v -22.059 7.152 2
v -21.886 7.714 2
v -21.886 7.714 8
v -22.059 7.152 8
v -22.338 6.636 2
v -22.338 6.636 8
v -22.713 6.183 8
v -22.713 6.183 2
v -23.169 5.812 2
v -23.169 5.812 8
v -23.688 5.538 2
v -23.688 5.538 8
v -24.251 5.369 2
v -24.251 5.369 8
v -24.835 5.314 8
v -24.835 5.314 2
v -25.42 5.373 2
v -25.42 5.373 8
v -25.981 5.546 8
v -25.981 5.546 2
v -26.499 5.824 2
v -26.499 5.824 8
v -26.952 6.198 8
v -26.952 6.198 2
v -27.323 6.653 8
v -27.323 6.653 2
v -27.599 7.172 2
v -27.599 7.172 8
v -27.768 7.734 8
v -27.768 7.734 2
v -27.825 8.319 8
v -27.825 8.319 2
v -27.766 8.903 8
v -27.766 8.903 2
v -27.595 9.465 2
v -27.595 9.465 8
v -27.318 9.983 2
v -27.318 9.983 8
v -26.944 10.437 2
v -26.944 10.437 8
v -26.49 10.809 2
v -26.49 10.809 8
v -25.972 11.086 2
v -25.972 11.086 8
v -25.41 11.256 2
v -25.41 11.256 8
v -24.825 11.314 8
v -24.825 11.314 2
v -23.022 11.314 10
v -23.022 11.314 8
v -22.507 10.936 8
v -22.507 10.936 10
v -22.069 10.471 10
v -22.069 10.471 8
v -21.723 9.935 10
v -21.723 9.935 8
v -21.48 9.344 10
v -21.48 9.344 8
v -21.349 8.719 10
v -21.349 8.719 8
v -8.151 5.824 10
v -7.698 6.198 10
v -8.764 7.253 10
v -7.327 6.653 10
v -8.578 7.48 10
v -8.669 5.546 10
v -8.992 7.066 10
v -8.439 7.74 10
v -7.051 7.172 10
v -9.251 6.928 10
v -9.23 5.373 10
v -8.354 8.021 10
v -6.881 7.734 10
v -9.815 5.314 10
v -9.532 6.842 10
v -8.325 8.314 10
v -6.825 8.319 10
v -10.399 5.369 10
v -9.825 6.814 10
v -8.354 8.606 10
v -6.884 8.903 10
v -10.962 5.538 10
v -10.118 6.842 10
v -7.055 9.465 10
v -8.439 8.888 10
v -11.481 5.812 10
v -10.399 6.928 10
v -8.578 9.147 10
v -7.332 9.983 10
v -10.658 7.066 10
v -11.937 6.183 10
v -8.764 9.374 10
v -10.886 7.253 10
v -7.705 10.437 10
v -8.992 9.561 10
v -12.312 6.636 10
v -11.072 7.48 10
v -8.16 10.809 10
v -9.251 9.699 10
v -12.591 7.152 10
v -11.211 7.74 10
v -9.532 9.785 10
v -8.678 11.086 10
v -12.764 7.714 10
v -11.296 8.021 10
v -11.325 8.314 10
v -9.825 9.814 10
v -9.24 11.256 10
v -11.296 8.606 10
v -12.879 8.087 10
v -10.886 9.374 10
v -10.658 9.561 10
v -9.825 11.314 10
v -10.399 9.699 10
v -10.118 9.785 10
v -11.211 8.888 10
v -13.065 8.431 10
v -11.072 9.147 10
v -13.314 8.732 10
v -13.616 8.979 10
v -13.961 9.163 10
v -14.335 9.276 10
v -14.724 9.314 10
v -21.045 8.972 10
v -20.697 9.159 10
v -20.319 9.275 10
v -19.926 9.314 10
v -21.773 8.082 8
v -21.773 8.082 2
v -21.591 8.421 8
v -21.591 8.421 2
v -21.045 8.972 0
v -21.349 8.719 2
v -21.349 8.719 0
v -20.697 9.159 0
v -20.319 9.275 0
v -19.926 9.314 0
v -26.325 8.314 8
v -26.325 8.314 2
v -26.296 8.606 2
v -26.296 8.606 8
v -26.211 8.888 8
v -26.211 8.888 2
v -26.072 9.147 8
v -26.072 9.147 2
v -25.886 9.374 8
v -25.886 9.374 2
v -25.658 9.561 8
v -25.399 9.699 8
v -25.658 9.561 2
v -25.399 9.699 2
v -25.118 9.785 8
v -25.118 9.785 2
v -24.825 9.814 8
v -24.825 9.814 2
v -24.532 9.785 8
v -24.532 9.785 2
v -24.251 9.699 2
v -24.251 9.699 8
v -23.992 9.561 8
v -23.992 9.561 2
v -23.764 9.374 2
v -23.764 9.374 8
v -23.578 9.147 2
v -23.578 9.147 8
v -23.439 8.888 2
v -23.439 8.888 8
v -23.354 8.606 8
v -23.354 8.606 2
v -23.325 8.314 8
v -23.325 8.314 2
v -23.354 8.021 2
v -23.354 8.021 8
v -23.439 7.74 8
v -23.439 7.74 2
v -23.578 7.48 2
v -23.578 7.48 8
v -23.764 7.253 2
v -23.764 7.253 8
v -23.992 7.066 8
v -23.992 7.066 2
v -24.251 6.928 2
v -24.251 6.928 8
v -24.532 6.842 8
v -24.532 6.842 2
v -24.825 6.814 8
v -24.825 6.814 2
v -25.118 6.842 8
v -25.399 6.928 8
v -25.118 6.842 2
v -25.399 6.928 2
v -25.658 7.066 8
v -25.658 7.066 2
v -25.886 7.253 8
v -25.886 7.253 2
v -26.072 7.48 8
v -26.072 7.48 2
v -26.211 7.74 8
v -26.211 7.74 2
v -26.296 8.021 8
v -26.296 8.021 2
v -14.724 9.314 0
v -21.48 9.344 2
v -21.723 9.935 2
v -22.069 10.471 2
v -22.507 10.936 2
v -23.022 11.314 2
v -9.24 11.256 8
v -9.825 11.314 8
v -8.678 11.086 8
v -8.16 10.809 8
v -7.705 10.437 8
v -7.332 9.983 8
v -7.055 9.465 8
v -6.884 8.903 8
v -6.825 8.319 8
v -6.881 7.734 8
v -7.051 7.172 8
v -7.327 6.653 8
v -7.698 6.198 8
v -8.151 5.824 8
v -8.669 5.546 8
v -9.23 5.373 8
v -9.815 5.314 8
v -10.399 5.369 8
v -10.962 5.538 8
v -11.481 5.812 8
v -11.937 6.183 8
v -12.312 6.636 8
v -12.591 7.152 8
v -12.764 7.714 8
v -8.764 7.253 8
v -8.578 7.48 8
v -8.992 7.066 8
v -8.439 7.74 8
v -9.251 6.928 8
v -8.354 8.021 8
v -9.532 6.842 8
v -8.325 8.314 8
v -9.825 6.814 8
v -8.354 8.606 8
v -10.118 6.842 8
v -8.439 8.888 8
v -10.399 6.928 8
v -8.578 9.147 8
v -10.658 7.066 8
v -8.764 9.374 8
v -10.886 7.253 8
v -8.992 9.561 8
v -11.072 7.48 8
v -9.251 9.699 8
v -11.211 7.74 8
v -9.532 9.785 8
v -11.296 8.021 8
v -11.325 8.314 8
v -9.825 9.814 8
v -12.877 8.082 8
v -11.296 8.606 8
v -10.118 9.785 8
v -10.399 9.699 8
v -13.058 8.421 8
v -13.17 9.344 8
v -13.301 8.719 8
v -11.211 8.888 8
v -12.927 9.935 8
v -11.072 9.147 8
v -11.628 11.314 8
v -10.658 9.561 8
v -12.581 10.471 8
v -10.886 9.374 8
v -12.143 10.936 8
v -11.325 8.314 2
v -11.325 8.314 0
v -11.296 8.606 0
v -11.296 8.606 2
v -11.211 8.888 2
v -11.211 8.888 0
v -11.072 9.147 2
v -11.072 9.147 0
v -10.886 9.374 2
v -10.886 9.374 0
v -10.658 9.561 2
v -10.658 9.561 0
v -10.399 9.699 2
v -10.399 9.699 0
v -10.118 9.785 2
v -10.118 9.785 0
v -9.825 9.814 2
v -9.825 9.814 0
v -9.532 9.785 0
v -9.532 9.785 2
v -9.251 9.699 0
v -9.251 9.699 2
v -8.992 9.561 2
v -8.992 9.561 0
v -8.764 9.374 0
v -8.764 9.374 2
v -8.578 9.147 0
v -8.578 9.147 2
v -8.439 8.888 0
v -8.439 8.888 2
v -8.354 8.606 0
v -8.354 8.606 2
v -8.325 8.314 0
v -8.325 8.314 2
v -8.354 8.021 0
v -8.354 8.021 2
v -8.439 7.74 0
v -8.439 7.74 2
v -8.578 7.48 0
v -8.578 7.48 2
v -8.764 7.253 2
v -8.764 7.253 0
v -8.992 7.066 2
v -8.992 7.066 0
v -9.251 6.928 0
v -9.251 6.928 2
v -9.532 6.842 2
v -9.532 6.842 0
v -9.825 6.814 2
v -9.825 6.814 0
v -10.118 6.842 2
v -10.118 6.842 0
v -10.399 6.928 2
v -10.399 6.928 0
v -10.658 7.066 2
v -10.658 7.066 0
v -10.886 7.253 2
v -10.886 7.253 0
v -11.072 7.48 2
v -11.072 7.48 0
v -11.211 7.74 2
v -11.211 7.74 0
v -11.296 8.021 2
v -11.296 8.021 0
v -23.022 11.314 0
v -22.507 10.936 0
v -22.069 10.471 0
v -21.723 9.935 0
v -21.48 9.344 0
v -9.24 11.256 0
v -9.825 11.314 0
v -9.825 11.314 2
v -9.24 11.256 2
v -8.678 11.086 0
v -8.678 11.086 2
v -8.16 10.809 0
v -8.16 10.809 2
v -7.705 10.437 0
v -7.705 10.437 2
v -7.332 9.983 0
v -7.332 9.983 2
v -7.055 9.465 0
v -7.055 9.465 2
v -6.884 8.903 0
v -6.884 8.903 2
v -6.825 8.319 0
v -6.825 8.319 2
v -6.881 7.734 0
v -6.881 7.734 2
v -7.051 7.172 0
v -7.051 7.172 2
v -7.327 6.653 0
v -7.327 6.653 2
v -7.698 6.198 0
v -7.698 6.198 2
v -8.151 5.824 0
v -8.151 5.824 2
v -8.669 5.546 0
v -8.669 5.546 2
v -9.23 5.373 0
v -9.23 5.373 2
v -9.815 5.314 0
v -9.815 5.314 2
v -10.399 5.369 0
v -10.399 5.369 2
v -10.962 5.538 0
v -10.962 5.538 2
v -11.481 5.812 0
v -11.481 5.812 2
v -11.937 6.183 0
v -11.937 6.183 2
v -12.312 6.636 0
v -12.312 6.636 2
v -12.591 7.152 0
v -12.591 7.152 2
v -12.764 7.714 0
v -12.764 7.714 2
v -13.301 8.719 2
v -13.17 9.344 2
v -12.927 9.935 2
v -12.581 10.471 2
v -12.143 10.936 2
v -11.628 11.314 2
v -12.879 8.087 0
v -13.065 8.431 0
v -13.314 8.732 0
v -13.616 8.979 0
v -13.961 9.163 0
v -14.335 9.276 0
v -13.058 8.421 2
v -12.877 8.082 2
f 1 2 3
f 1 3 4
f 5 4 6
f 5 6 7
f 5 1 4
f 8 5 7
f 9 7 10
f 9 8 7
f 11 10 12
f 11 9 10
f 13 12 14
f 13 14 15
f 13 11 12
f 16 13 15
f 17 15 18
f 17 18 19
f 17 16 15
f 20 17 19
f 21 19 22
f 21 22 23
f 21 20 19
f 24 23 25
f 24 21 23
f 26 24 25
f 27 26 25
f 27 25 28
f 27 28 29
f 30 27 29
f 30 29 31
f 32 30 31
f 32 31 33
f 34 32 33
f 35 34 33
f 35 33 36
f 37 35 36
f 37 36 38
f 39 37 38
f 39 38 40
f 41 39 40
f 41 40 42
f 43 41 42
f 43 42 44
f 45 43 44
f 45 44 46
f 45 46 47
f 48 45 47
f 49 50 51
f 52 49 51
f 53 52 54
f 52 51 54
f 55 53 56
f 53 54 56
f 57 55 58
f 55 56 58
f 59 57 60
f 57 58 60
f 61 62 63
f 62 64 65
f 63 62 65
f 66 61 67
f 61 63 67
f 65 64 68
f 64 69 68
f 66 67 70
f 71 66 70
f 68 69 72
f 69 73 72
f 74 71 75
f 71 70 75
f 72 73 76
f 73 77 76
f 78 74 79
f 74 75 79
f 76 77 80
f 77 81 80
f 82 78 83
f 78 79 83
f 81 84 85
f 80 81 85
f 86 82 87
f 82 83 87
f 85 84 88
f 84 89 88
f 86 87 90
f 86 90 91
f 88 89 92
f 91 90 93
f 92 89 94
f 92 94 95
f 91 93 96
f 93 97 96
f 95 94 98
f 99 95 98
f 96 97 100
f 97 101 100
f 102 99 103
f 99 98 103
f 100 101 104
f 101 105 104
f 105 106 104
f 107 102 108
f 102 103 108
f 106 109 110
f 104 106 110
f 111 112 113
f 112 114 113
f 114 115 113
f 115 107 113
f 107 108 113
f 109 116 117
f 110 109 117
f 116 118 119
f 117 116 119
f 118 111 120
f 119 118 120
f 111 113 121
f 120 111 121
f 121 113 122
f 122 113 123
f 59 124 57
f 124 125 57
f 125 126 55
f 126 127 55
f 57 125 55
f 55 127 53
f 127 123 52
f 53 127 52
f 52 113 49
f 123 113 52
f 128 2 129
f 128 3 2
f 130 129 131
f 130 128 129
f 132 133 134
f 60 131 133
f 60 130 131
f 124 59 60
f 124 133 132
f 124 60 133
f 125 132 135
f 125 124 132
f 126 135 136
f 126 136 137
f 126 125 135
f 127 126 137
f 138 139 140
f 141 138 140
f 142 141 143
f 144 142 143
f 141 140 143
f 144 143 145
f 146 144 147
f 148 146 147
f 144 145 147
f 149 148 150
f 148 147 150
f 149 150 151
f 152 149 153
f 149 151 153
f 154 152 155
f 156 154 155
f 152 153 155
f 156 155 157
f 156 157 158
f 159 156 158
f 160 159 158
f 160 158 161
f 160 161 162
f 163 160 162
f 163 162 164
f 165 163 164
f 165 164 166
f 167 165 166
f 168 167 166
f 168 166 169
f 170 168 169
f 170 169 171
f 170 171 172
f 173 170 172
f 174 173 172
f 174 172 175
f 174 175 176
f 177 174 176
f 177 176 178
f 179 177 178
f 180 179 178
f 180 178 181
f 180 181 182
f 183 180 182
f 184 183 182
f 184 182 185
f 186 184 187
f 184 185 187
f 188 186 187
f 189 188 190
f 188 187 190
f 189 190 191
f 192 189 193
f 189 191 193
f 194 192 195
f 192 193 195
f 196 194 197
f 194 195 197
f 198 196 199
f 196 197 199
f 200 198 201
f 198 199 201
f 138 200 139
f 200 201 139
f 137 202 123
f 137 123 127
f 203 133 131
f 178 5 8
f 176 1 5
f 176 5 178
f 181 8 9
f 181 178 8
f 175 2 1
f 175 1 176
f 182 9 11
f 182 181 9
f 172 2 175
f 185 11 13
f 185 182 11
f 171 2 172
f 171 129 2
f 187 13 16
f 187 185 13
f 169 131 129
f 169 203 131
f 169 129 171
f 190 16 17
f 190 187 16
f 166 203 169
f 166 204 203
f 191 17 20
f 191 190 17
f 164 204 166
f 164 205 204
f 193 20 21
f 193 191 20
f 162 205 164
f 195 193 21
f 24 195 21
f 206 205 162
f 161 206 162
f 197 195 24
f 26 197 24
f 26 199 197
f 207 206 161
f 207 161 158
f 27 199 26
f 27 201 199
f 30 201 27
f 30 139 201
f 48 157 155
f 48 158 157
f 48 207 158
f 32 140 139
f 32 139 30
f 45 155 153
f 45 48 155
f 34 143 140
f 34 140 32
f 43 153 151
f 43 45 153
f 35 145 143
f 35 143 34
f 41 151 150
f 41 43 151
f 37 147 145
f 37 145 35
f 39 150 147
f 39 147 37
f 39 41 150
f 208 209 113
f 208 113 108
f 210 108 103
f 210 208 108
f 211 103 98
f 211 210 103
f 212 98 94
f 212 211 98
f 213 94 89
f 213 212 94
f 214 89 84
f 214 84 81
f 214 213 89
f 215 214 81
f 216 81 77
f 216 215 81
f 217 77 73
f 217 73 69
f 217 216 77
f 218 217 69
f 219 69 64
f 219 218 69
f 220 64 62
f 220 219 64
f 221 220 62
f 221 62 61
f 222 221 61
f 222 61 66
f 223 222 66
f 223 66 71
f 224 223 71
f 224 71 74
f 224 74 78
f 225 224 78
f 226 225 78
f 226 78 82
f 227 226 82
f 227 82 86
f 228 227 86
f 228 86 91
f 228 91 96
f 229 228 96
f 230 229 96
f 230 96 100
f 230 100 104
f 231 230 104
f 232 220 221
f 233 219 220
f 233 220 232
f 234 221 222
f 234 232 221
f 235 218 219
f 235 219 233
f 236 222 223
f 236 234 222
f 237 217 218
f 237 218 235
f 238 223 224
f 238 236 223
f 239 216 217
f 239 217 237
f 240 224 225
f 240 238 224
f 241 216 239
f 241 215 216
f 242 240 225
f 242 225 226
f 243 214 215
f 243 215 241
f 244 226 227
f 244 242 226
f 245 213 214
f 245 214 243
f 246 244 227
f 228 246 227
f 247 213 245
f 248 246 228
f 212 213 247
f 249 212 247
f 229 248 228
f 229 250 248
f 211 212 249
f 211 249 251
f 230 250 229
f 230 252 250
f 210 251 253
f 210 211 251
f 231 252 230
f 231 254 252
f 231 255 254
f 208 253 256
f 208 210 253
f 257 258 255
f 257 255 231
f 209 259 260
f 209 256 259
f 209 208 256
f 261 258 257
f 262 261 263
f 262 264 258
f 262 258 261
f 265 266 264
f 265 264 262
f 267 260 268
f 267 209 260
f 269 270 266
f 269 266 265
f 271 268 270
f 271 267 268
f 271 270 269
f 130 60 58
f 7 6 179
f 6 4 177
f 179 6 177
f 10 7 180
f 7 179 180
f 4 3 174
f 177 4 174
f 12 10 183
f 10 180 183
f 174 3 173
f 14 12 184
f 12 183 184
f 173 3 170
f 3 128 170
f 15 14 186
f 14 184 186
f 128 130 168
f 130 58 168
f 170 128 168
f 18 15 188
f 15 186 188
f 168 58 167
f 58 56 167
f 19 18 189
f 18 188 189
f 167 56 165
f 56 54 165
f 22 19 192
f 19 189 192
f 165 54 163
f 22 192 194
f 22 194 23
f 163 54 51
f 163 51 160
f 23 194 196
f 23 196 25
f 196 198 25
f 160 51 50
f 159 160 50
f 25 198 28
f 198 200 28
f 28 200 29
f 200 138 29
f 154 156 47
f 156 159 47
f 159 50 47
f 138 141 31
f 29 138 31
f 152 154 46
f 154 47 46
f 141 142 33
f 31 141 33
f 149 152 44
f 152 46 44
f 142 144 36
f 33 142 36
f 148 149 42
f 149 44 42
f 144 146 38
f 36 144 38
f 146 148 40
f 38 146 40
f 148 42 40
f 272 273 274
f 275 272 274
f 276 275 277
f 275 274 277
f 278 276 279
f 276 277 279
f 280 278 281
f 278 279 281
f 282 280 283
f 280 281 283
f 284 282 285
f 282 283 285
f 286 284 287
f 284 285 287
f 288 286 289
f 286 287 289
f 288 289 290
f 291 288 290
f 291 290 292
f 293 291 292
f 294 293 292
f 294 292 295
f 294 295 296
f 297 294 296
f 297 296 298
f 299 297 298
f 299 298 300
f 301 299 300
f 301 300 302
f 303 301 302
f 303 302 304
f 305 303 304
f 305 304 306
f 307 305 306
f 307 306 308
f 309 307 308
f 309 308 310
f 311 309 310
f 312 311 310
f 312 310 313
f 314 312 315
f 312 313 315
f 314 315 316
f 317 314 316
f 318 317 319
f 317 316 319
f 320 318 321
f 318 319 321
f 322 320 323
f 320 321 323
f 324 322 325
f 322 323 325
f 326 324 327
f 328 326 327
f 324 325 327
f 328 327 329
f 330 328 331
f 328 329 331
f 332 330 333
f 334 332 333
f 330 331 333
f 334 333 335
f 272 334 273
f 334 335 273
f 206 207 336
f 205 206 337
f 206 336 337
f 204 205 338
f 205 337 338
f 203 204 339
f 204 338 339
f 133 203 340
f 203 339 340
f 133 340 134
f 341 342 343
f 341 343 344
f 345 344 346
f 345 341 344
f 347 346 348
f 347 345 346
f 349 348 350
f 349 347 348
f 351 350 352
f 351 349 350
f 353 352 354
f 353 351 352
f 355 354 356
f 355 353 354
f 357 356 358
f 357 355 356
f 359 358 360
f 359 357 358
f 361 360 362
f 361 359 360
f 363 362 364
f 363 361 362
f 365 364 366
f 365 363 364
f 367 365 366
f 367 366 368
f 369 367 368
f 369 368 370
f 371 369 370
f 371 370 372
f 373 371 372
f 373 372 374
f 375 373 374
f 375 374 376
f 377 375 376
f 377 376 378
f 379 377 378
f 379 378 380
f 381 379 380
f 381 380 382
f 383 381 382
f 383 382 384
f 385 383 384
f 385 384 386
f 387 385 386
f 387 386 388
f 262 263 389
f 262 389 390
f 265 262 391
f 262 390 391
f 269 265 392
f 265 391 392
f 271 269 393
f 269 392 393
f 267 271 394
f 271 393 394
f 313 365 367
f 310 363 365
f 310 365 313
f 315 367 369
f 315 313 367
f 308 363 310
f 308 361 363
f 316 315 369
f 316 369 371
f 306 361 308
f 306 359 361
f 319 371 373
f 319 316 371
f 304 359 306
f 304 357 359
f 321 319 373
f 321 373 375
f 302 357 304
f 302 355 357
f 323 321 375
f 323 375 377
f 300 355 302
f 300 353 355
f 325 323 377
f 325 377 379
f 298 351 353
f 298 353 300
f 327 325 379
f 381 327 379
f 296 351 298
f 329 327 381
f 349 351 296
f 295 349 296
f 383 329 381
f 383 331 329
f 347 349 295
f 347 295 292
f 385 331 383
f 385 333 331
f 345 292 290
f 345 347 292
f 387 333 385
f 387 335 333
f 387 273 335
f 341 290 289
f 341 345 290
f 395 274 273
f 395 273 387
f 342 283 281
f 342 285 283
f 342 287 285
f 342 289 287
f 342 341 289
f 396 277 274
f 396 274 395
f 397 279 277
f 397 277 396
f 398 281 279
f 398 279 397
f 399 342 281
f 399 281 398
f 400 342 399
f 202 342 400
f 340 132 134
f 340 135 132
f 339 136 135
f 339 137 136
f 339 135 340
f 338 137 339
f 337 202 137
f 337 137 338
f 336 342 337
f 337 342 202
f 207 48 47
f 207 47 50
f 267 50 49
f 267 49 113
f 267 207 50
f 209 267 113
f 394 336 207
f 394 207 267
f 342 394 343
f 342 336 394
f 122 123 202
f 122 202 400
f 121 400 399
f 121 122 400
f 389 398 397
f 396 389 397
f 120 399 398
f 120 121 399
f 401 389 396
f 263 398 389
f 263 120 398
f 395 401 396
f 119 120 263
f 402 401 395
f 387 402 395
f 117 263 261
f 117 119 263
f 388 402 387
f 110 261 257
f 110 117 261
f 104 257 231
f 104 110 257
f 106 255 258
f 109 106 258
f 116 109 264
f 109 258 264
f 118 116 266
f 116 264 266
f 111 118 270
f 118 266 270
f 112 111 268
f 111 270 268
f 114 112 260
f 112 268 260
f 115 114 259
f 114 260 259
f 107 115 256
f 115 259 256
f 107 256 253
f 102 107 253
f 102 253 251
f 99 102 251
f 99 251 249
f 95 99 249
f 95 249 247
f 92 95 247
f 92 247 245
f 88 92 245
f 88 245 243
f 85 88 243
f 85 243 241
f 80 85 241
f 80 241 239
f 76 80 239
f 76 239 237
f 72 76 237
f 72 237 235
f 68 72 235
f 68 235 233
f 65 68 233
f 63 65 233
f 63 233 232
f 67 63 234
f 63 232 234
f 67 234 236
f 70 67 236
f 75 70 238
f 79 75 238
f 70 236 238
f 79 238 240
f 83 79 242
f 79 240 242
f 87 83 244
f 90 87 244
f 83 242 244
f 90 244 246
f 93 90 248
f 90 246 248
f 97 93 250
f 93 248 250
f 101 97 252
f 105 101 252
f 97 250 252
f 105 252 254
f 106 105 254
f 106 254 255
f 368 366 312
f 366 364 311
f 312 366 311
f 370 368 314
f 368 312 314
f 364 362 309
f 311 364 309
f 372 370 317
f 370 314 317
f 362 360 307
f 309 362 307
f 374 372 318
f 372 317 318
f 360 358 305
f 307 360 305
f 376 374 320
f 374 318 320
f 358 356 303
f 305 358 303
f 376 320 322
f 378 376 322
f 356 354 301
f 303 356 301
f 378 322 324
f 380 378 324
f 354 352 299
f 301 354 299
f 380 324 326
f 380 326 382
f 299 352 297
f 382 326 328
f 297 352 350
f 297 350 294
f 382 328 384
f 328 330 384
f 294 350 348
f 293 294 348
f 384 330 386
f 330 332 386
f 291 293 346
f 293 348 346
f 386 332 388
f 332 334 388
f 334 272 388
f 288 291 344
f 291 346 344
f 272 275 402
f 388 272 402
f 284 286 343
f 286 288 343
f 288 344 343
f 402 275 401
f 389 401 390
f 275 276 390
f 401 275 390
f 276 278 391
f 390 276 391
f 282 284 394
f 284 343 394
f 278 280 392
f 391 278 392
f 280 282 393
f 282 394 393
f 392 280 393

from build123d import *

# Parameters (mm, degrees)
ESTRUSIONE_ESTRUSIONE1_DEPTH = 10
SCHIZZO5_R                   = 1.499999999999997
SCHIZZO5_R_2                 = 1.5000000000000009
TAGLIO_ESTRUSIONE1_DEPTH     = 10
SCHIZZO6_R                   = 3.4999999999999996
TAGLIO_ESTRUSIONE2_DEPTH     = 2
TAGLIO_ESTRUSIONE3_START     = -8
SCHIZZO6_2_R                 = 3.4999999999999996
TAGLIO_ESTRUSIONE3_DEPTH     = 12
TAGLIO_ESTRUSIONE4_START     = -2
SCHIZZO7_R                   = 3.4999999999999996
TAGLIO_ESTRUSIONE4_DEPTH     = 6
RACCORDO1_R                  = 2
RACCORDO2_R                  = 2


with BuildPart() as part:
    # Schizzo1 → Estrusione-Estrusione1 (new body)
    with BuildSketch(Plane.XY):
        with BuildLine():
            Line((-24.824967096652905, 11.313668704827196), (-9.824967096652905, 11.313668704827196))
            ThreePointArc((-9.824967096652905, 11.313668704827196), (-8.092916289084027, 5.864178962044019), (-12.653394221399095, 9.313668704827194))
            Line((-12.653394221399095, 9.313668704827194), (-21.996539971906714, 9.313668704827194))
            ThreePointArc((-21.996539971906714, 9.313668704827194), (-26.557017904221784, 5.864178962044019), (-24.824967096652905, 11.313668704827196))
        make_face()
    extrude(amount=ESTRUSIONE_ESTRUSIONE1_DEPTH)

    # Schizzo5 → Taglio-Estrusione1 (cut)
    with BuildSketch(Plane(origin=(0, 0, 0), x_dir=(-1, 0, 0), z_dir=(0, 0, -1))):
        with Locations((9.824967096652905, 8.313668704827196)):
            Circle(SCHIZZO5_R)
        with Locations((24.824967096652905, 8.313668704827196)):
            Circle(SCHIZZO5_R_2)
    extrude(amount=-TAGLIO_ESTRUSIONE1_DEPTH, mode=Mode.SUBTRACT)

    # Schizzo6 → Taglio-Estrusione2 (cut)
    with BuildSketch(Plane(origin=(0, 0, 0), x_dir=(-1, 0, 0), z_dir=(0, 0, -1))):
        with Locations((24.824967096652905, 8.313668704827196)):
            Circle(SCHIZZO6_R)
    extrude(amount=-TAGLIO_ESTRUSIONE2_DEPTH, mode=Mode.SUBTRACT)

    # Schizzo6<2> → Taglio-Estrusione3 (cut)
    with BuildSketch(Plane(origin=(0, 0, 0), x_dir=(-1, 0, 0), z_dir=(0, 0, -1)).offset(TAGLIO_ESTRUSIONE3_START)):
        with Locations((24.824967096652905, 8.313668704827196)):
            Circle(SCHIZZO6_2_R)
    extrude(amount=-TAGLIO_ESTRUSIONE3_DEPTH, mode=Mode.SUBTRACT)

    # Schizzo7 → Taglio-Estrusione4 (cut)
    with BuildSketch(Plane(origin=(0, 0, 0), x_dir=(-1, 0, 0), z_dir=(0, 0, -1)).offset(TAGLIO_ESTRUSIONE4_START)):
        with Locations((9.824967096652905, 8.313668704827196)):
            Circle(SCHIZZO7_R)
    extrude(amount=-TAGLIO_ESTRUSIONE4_DEPTH, mode=Mode.SUBTRACT)

    # Raccordo1
    raccordo1_edges = [part.edges().sort_by_distance(p)[0] for p in [
        (-21.996539971906714, 9.313668704827194, 5),
    ]]
    fillet(raccordo1_edges, radius=RACCORDO1_R)

    # Raccordo2
    raccordo2_edges = [part.edges().sort_by_distance(p)[0] for p in [
        (-12.653394221399093, 9.313668704827194, 1),
    ]]
    fillet(raccordo2_edges, radius=RACCORDO2_R - 0.0001)  # a hair under: the kernel refuses the full size


solid = part.part
